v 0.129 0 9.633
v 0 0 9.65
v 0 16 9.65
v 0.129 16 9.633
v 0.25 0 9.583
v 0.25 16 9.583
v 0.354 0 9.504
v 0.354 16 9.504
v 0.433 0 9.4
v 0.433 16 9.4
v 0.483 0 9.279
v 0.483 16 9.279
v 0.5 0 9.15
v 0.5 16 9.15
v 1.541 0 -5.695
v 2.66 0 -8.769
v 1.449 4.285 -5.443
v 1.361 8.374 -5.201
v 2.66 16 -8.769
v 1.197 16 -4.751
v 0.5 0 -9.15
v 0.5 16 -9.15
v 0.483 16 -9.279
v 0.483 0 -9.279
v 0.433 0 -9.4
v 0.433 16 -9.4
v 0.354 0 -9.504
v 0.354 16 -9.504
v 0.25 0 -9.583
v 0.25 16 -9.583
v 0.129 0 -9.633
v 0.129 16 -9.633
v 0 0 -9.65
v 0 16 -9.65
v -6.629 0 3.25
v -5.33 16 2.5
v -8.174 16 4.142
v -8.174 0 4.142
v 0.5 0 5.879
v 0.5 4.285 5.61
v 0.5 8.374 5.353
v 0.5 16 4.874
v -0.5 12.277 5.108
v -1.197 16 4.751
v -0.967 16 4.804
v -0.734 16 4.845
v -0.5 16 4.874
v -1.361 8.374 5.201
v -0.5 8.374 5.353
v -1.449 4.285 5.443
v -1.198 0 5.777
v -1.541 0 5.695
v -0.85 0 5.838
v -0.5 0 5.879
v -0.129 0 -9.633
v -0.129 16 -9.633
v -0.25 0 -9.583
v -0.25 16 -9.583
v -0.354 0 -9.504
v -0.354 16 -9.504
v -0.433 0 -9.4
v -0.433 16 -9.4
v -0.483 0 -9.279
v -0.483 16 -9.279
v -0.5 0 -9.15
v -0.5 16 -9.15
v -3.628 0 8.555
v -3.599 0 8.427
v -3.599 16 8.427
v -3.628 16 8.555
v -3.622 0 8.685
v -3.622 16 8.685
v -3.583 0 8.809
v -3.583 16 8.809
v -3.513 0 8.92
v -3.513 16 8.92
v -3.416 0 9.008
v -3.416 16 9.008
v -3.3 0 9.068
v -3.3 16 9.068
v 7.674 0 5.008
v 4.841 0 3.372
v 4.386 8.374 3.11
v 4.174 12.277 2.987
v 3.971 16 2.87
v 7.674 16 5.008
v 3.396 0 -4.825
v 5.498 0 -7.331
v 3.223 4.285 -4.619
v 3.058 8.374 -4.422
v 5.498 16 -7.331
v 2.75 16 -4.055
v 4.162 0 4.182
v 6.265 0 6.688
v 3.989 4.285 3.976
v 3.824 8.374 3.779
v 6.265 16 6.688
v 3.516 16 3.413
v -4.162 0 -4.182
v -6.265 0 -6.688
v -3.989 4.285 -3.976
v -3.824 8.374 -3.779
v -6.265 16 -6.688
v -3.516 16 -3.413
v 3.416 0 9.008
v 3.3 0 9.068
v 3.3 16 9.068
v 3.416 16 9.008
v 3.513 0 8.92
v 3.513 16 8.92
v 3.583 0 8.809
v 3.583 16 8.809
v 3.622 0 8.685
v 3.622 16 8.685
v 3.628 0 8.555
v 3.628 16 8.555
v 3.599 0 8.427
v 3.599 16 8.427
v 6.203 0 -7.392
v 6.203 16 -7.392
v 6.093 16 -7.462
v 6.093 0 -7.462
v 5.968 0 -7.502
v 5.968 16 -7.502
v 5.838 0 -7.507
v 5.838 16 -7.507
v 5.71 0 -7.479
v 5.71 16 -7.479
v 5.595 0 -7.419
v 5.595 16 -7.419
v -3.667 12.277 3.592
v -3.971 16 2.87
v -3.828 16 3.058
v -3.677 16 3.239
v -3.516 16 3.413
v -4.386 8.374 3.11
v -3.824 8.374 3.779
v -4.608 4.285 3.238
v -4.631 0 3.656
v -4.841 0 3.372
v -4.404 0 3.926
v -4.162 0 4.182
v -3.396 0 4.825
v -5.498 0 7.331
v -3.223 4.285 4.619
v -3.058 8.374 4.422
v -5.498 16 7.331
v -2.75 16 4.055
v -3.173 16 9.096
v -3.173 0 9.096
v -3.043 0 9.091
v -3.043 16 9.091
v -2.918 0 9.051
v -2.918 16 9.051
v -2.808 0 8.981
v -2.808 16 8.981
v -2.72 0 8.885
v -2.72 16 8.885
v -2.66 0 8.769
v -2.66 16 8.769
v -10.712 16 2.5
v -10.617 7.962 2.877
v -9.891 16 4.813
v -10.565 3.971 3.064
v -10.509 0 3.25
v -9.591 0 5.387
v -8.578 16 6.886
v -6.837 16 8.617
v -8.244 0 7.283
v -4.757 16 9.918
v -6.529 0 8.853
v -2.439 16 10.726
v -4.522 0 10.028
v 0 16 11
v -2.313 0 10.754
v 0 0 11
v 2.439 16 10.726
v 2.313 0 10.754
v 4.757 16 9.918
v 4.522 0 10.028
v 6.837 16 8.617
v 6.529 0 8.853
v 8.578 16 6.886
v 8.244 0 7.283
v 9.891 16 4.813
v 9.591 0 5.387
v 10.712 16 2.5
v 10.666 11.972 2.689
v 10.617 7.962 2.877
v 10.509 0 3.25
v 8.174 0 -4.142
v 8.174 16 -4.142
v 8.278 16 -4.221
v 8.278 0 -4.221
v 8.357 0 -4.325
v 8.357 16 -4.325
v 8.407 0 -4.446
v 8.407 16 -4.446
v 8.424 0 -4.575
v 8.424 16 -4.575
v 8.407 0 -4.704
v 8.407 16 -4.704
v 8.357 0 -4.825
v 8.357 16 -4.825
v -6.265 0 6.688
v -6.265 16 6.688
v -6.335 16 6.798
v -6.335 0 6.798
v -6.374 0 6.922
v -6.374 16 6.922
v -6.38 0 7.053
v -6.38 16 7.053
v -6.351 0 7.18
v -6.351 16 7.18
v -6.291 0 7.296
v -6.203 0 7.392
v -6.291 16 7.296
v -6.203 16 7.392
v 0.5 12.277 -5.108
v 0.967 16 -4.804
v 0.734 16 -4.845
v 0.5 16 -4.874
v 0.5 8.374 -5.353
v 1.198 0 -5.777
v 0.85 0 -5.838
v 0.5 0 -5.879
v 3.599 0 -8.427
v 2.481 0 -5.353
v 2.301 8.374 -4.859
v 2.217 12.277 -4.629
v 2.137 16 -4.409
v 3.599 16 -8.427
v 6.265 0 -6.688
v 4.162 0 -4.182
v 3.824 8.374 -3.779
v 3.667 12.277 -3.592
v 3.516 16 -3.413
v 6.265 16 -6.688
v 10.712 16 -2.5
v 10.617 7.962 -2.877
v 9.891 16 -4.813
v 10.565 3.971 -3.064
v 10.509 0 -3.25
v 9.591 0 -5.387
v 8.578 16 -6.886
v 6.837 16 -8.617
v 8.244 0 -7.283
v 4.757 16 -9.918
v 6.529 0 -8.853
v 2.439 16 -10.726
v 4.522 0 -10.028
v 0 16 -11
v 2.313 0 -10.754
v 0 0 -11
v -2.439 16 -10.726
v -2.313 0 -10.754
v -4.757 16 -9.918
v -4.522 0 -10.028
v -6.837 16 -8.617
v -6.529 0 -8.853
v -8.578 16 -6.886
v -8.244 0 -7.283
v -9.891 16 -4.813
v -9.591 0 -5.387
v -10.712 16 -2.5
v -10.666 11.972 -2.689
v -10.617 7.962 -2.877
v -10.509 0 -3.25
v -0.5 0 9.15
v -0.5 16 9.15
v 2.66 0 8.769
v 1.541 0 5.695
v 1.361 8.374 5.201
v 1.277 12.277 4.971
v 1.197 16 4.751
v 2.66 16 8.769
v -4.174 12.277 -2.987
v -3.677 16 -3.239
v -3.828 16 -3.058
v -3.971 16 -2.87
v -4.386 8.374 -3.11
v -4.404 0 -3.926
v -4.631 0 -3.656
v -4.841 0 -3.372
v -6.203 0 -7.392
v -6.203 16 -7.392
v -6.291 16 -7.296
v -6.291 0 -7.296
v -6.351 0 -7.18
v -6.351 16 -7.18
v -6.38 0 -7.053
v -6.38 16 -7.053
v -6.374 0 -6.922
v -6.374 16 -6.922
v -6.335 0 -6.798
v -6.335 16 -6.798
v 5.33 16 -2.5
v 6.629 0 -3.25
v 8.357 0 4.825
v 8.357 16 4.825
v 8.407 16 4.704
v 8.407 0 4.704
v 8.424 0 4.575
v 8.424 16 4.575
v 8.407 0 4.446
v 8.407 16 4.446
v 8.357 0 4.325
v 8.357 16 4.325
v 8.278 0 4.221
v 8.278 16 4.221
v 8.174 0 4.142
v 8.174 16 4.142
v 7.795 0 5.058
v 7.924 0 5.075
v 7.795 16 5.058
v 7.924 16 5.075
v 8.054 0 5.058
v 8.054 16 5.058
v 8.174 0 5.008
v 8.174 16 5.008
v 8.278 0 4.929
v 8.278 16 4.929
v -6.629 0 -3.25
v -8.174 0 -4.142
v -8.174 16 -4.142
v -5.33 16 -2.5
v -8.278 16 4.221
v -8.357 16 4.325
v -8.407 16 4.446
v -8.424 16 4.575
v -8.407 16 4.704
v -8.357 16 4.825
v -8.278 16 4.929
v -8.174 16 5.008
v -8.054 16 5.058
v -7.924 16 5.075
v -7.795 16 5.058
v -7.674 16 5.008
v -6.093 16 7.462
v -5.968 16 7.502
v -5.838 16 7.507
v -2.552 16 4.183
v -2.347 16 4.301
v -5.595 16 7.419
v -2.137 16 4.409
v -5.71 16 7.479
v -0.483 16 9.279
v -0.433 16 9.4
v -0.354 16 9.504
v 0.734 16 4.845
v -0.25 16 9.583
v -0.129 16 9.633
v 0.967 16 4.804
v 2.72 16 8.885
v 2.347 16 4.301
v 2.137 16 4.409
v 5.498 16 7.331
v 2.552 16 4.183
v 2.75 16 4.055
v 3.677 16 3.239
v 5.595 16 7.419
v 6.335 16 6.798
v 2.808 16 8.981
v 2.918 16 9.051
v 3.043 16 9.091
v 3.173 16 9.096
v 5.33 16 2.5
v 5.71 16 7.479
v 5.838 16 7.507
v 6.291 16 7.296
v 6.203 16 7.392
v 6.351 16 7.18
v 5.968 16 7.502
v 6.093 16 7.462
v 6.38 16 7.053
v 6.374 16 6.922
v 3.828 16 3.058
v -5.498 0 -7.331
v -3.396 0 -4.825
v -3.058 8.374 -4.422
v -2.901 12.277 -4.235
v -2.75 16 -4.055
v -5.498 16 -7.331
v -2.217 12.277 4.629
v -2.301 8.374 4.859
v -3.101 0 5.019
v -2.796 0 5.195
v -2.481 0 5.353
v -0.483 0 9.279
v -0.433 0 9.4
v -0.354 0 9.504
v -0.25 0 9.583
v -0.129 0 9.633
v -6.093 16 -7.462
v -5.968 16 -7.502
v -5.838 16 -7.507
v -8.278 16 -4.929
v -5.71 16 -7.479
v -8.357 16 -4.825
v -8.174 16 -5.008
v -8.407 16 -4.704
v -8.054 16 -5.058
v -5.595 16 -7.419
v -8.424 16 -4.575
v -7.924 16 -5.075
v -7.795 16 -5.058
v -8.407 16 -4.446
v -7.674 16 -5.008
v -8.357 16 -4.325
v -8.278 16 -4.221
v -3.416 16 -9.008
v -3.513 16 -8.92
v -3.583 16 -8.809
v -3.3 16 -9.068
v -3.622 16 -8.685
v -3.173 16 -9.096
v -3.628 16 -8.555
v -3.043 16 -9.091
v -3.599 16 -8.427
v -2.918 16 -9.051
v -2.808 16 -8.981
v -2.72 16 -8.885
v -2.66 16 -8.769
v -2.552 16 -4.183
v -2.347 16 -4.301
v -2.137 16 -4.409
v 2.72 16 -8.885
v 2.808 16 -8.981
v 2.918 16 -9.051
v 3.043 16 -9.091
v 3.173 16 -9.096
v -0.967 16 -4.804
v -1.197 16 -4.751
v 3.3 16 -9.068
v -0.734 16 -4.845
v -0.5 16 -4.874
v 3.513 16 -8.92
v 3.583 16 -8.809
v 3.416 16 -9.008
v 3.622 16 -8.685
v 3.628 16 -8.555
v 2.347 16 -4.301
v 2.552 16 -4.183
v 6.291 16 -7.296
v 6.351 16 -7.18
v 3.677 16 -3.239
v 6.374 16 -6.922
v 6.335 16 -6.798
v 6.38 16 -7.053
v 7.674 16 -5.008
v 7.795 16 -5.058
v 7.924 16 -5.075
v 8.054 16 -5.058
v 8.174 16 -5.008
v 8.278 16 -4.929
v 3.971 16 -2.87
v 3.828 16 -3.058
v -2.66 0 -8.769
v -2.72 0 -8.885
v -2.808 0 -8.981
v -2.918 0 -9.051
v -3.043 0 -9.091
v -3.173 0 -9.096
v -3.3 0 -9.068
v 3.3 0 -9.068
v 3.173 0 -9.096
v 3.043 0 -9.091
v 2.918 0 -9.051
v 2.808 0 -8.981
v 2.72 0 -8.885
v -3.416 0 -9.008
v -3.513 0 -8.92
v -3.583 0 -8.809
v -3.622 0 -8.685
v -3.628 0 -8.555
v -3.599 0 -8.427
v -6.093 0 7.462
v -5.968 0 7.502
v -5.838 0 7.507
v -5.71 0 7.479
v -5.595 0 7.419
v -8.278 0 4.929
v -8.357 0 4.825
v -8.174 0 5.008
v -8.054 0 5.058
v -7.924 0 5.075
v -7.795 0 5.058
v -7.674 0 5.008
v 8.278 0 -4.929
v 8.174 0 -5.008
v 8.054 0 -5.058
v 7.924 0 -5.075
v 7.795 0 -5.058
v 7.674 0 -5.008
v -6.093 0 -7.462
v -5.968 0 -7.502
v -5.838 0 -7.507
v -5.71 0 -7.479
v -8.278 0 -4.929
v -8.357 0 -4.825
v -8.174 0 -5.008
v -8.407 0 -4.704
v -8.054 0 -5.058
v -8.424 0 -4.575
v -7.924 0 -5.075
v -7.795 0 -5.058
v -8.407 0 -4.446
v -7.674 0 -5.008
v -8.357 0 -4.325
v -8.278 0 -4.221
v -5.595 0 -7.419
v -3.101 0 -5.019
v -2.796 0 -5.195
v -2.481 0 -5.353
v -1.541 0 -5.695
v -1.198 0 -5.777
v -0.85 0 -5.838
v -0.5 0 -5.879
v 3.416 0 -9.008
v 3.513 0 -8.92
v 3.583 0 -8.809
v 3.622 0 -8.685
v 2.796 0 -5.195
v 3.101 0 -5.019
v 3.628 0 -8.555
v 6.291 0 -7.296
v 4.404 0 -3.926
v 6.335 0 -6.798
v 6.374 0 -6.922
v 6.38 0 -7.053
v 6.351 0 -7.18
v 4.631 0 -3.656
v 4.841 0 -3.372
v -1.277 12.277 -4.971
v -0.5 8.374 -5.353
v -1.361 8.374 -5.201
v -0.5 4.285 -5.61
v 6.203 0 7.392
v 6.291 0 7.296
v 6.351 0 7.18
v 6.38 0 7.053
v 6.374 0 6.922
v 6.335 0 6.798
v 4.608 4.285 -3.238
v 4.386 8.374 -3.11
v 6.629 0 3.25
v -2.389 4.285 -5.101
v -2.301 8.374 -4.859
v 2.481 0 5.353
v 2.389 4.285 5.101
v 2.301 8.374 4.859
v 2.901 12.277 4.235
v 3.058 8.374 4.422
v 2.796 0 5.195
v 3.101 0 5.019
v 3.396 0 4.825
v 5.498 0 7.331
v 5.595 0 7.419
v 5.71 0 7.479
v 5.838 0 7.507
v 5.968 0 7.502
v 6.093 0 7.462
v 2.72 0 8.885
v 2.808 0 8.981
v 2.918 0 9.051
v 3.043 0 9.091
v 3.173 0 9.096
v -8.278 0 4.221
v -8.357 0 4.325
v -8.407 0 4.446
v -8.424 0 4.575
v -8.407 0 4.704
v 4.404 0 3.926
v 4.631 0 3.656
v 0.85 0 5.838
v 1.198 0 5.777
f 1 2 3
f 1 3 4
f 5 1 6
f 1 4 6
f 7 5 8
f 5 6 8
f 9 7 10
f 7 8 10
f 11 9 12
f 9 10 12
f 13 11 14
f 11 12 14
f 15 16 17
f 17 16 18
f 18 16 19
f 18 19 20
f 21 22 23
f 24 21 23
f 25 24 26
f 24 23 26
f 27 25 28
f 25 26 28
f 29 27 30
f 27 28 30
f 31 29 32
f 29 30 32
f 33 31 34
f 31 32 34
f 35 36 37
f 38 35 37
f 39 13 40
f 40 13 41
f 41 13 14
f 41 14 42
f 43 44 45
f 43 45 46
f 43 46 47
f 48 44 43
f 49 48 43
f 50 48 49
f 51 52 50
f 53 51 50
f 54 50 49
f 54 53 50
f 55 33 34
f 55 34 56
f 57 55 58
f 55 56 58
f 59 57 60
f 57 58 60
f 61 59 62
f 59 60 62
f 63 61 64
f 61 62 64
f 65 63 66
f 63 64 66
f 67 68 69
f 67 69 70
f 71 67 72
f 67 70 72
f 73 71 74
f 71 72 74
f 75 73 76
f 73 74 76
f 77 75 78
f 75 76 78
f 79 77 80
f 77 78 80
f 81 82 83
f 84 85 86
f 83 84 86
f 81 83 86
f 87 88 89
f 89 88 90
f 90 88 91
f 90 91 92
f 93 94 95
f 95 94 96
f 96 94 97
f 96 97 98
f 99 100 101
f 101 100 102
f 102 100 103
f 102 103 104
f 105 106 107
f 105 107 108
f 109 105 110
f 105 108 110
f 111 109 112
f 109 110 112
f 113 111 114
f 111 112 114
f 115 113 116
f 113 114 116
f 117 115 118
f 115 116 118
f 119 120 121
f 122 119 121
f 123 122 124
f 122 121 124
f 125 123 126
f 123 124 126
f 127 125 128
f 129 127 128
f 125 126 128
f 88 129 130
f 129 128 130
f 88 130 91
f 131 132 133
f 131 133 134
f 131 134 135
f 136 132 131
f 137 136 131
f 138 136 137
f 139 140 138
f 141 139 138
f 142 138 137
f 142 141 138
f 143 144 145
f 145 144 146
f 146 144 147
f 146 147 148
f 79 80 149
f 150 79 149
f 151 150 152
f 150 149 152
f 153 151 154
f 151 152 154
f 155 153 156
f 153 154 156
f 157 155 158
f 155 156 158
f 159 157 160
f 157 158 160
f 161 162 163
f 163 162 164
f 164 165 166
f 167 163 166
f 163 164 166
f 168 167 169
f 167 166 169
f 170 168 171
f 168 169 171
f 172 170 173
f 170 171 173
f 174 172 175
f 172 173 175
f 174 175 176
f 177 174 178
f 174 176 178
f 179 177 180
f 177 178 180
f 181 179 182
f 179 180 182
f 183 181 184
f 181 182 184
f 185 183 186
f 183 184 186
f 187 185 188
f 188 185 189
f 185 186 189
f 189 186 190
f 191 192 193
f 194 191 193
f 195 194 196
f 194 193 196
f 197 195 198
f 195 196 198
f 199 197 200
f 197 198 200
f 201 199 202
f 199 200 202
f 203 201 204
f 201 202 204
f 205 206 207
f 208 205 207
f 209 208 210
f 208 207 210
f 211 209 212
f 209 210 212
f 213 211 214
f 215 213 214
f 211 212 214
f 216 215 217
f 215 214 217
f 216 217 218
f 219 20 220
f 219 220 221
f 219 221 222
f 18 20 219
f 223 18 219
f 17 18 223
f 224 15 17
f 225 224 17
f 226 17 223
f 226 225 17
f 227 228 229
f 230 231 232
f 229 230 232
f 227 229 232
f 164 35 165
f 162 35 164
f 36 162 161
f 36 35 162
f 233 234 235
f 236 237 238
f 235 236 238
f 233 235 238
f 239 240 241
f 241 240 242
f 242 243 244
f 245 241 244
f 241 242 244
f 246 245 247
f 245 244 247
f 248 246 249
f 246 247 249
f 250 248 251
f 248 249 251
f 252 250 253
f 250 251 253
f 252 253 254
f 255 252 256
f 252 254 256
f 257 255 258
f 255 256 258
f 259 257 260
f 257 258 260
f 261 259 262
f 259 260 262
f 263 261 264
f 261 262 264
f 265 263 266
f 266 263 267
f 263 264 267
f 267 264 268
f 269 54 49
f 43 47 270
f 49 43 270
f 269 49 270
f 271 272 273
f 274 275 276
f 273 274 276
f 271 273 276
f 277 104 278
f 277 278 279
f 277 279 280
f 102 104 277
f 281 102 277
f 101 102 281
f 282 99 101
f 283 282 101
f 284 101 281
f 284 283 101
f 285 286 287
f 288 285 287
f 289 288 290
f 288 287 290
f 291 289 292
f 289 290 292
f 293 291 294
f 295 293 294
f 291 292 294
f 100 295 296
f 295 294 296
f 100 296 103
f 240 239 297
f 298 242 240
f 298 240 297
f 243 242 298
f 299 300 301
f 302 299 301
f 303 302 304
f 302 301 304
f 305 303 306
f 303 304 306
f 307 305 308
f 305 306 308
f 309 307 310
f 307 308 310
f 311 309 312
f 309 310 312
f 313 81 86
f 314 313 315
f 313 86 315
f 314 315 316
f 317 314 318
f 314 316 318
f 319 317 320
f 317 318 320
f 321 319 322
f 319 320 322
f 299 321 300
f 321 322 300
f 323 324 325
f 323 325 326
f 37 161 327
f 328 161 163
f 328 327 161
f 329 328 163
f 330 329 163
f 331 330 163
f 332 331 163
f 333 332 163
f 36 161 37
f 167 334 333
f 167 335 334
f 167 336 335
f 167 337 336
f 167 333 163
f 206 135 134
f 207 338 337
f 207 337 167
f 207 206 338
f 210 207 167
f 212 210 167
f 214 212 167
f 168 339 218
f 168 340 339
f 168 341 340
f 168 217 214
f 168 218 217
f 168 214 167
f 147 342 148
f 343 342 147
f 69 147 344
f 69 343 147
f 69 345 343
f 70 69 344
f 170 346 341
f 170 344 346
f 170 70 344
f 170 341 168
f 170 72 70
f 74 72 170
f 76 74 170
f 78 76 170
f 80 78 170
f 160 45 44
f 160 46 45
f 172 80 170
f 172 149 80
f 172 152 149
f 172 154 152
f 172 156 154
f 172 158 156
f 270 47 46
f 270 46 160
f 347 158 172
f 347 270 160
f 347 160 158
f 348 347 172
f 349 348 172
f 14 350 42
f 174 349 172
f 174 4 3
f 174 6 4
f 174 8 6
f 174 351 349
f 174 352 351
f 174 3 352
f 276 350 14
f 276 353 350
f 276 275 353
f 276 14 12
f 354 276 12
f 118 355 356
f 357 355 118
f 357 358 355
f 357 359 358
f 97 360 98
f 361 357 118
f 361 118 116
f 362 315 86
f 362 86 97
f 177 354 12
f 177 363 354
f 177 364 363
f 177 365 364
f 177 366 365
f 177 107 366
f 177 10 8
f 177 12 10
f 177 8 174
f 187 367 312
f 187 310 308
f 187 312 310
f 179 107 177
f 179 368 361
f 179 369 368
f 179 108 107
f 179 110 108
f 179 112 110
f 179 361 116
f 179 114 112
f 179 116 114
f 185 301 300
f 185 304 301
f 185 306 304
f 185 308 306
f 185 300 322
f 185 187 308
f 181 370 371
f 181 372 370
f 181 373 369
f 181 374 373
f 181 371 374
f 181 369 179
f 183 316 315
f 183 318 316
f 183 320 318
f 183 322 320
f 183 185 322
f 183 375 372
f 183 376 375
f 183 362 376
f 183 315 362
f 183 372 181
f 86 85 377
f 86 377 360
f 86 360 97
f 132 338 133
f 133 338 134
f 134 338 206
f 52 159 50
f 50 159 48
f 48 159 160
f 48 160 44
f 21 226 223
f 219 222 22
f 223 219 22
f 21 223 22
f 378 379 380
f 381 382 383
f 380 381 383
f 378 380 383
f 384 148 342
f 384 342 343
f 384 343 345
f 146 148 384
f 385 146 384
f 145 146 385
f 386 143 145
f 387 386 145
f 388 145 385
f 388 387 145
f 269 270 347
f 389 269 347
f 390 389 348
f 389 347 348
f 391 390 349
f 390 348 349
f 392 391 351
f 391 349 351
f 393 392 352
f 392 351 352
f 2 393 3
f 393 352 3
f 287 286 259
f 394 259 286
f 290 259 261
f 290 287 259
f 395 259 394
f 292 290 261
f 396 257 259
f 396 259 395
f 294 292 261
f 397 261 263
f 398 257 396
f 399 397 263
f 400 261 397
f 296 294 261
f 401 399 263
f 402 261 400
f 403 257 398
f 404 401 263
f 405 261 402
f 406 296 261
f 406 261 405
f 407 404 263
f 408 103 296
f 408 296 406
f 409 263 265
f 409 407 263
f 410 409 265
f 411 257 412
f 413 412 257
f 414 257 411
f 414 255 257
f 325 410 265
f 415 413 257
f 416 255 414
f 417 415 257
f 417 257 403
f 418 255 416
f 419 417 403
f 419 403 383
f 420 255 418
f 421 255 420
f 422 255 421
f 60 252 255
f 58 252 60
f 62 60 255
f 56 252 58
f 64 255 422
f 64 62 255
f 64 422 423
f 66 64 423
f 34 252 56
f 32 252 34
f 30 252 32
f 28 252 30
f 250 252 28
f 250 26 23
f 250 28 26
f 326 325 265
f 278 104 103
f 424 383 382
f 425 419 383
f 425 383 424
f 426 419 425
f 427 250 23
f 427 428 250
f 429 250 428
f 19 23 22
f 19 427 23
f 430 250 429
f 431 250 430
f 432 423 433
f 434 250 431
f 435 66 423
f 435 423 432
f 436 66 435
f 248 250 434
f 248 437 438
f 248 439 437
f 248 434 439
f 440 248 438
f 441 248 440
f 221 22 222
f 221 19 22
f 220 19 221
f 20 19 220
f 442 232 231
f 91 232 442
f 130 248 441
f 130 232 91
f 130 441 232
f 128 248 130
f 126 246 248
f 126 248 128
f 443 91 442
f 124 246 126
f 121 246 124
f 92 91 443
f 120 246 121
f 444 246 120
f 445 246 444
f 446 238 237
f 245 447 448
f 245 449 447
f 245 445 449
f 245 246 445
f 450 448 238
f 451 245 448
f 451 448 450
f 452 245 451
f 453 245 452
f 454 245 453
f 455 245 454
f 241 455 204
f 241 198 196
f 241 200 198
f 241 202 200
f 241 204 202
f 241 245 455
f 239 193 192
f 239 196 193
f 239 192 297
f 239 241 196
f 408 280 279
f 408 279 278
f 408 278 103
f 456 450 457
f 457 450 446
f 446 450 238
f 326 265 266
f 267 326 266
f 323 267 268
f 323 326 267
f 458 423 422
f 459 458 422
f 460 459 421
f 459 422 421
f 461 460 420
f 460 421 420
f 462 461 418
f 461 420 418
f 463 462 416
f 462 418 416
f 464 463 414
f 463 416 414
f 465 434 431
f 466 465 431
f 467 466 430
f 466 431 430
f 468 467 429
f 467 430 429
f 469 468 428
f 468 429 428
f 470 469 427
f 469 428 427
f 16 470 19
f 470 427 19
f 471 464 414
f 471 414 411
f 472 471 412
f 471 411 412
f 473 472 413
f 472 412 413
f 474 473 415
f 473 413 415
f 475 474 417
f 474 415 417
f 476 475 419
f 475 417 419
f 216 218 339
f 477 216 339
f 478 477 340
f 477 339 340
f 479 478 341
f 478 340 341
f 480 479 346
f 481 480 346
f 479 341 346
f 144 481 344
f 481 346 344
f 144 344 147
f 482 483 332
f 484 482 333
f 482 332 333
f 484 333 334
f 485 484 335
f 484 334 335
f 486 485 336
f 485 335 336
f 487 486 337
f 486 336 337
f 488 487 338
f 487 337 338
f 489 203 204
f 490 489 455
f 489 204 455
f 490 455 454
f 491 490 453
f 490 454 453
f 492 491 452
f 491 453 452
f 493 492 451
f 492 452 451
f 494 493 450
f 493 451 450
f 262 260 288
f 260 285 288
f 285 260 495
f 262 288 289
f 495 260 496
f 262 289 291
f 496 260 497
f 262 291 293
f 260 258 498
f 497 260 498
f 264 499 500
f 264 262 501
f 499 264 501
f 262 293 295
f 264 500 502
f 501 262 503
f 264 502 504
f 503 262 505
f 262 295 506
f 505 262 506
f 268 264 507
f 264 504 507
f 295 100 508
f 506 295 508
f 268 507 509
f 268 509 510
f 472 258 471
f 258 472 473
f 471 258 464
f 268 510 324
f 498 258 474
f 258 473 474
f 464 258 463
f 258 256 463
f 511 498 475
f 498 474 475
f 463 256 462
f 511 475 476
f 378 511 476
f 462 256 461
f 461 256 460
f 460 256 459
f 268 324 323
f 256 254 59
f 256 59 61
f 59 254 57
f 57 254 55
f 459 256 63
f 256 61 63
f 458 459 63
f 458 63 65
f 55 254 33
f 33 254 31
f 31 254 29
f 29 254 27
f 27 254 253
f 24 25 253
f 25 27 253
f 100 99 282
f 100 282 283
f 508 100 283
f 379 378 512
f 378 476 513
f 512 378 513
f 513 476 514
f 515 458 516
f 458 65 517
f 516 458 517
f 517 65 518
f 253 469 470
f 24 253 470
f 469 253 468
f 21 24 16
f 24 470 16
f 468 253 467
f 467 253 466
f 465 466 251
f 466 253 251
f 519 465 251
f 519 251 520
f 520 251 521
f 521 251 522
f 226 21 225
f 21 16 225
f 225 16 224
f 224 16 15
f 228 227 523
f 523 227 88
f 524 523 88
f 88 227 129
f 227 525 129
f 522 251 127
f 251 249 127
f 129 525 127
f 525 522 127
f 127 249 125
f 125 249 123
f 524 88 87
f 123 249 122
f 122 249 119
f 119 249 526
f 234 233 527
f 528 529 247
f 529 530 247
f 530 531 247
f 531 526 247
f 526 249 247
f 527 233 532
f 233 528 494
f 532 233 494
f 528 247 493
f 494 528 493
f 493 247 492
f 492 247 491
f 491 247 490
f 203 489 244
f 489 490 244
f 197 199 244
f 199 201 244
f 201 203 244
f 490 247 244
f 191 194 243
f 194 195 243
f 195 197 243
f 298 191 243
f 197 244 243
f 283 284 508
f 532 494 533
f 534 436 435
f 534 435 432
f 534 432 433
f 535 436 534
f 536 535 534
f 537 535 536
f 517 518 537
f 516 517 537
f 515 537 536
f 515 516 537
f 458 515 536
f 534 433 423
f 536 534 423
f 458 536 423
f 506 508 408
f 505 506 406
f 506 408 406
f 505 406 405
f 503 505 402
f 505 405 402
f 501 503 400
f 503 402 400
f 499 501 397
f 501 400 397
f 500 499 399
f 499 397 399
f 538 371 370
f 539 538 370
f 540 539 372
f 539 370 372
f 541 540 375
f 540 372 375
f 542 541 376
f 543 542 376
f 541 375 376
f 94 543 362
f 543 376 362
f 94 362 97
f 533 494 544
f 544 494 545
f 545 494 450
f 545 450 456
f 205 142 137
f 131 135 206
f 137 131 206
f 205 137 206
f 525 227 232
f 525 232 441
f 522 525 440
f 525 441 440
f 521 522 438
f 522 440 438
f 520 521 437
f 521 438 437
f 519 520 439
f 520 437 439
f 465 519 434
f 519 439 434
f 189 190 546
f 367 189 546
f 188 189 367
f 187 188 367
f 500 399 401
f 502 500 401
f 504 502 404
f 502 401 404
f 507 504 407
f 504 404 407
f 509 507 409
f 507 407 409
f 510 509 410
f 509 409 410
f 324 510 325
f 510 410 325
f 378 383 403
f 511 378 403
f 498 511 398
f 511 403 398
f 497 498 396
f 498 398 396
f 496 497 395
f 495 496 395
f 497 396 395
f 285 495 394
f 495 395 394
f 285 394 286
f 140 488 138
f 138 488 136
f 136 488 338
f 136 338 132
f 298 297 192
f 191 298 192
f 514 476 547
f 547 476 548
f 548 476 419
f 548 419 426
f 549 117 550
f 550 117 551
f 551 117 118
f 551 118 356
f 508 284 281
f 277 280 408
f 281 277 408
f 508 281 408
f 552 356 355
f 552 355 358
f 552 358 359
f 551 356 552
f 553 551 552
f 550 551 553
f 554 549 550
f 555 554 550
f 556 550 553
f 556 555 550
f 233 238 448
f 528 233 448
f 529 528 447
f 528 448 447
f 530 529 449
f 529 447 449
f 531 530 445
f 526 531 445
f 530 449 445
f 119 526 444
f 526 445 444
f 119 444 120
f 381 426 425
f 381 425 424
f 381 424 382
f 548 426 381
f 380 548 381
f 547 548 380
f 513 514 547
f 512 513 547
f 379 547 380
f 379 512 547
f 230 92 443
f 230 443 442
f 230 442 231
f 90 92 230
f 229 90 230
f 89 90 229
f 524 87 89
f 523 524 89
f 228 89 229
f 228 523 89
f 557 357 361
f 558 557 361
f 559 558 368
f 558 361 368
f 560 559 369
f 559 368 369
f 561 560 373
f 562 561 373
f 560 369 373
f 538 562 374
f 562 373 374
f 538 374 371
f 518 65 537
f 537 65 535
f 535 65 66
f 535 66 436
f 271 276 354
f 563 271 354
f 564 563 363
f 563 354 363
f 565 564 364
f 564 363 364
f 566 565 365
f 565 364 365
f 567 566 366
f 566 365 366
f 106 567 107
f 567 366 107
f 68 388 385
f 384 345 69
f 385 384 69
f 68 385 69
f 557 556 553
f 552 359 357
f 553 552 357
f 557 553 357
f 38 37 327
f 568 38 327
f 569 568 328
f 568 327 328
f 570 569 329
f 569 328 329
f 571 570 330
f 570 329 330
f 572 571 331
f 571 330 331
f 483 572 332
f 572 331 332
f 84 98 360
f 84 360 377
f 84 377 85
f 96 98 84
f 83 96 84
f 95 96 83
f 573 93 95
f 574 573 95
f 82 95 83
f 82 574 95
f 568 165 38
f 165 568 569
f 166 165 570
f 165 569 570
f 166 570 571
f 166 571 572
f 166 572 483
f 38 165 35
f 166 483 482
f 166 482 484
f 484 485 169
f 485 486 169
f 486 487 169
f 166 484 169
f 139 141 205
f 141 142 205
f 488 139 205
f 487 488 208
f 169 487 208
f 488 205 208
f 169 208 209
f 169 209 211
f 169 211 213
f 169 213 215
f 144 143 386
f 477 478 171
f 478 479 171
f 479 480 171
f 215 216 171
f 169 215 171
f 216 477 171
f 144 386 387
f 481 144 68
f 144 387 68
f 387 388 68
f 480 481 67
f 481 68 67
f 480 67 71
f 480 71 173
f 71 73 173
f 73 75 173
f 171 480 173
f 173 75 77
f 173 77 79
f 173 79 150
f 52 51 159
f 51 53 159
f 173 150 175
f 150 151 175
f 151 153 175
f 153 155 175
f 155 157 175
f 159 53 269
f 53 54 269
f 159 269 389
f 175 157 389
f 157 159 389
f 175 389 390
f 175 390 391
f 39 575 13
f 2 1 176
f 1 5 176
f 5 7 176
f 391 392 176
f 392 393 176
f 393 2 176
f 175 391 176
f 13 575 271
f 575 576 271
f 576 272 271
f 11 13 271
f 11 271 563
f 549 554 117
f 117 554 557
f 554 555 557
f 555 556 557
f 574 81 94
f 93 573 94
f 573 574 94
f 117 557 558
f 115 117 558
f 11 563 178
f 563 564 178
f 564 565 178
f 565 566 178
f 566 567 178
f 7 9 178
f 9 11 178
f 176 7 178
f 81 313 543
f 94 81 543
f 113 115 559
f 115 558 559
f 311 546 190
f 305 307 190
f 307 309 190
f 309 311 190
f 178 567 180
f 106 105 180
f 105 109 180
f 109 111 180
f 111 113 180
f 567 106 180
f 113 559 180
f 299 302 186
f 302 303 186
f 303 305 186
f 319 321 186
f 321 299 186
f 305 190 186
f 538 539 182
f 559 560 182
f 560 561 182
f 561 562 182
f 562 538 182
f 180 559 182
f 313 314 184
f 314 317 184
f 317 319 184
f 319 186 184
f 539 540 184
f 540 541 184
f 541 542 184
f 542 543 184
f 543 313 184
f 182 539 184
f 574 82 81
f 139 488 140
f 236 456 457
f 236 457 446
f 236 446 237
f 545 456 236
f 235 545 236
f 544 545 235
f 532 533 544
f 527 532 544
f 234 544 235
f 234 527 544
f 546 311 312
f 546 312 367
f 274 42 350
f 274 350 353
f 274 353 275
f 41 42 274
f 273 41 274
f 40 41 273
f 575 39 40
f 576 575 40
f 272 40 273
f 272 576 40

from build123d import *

# Parameters (mm, degrees)
SKETCH1_R           = 11
BOSS_EXTRUDE1_DEPTH = 16
CUT_EXTRUDE1_DEPTH  = 23.315913604
CUT_EXTRUDE2_DEPTH  = 15


with BuildPart() as part:
    # Sketch1 → Boss-Extrude1 (new body)
    with BuildSketch(Plane(origin=(0, 0, 0), x_dir=(1, 0, 0), z_dir=(0, 1, 0))):
        with Locations(Location((0, 0, 0), (0, 0, 270))):
            Circle(SKETCH1_R)
    extrude(amount=BOSS_EXTRUDE1_DEPTH)

    # Sketch2 → Cut-Revolve1 (revolve, cut)
    with BuildSketch(Plane(origin=(0, 0, 0), x_dir=(0, 0, -1), z_dir=(1, 0, 0))):
        Polygon((0, 0), (0, 16), (4.9, 16), (5.9, 0), align=None)
    revolve(axis=Axis((0, 0, 0), (0, 1, 0)), mode=Mode.SUBTRACT)

    # Sketch3 → Cut-Extrude1 (cut, through all)
    with BuildSketch(Plane(origin=(0, 16, 0), x_dir=(1, 0, 0), z_dir=(0, 1, 0))):
        with BuildLine():
            Line((-0.5, 4.8), (0.5, 4.8))
            Line((0.5, 4.8), (0.5, 9.15))
            ThreePointArc((0.5, 9.15), (0.353553391, 9.503553391), (0, 9.65))
            ThreePointArc((0, 9.65), (-0.353553391, 9.503553391), (-0.5, 9.15))
            Line((-0.5, 9.15), (-0.5, 4.8))
        make_face()
        with BuildLine():
            Line((1.171850378, 4.681534651), (2.111542998, 4.339514508))
            Line((2.111542998, 4.339514508), (3.599330622, 8.427177409))
            ThreePointArc((3.599330622, 8.427177409), (3.582638205, 8.809496611), (3.300494383, 9.068033791))
            ThreePointArc((3.300494383, 9.068033791), (2.918175181, 9.051341374), (2.659638001, 8.769197552))
            Line((2.659638001, 8.769197552), (1.171850378, 4.681534651))
        make_face()
        with BuildLine():
            Line((2.702358305, 3.998407132), (3.468402748, 3.355619522))
            Line((3.468402748, 3.355619522), (6.26452885, 6.68791285))
            ThreePointArc((6.26452885, 6.68791285), (6.379603978, 7.052884526), (6.202900433, 7.392328876))
            ThreePointArc((6.202900433, 7.392328876), (5.837928757, 7.507404004), (5.498484407, 7.330700459))
            Line((5.498484407, 7.330700459), (2.702358305, 3.998407132))
        make_face()
        with BuildLine():
            Line((3.906921938, 2.833012702), (4.406921938, 1.966987298))
            Line((4.406921938, 1.966987298), (8.174132445, 4.141987298))
            ThreePointArc((8.174132445, 4.141987298), (8.407095358, 4.445590477), (8.357145147, 4.825))
            ThreePointArc((8.357145147, 4.825), (8.053541967, 5.057962913), (7.674132445, 5.008012702))
            Line((7.674132445, 5.008012702), (3.906921938, 2.833012702))
        make_face()
        with BuildLine():
            Line((4.640253126, 1.325915129), (4.813901303, 0.341107376))
            Line((4.813901303, 0.341107376), (9.097815029, 1.096476949))
            ThreePointArc((9.097815029, 1.096476949), (9.420566962, 1.302092607), (9.503394817, 1.675704914))
            ThreePointArc((9.503394817, 1.675704914), (9.297779158, 1.998456848), (8.924166851, 2.081284702))
            Line((8.924166851, 2.081284702), (4.640253126, 1.325915129))
        make_face()
        with BuildLine():
            Line((4.813901303, -0.341107376), (4.640253126, -1.325915129))
            Line((4.640253126, -1.325915129), (8.924166851, -2.081284702))
            ThreePointArc((8.924166851, -2.081284702), (9.297779158, -1.998456848), (9.503394817, -1.675704914))
            ThreePointArc((9.503394817, -1.675704914), (9.420566962, -1.302092607), (9.097815029, -1.096476949))
            Line((9.097815029, -1.096476949), (4.813901303, -0.341107376))
        make_face()
        with BuildLine():
            Line((4.406921938, -1.966987298), (3.906921938, -2.833012702))
            Line((3.906921938, -2.833012702), (7.674132445, -5.008012702))
            ThreePointArc((7.674132445, -5.008012702), (8.053541967, -5.057962913), (8.357145147, -4.825))
            ThreePointArc((8.357145147, -4.825), (8.407095358, -4.445590477), (8.174132445, -4.141987298))
            Line((8.174132445, -4.141987298), (4.406921938, -1.966987298))
        make_face()
        with BuildLine():
            Line((3.468402748, -3.355619522), (2.702358305, -3.998407132))
            Line((2.702358305, -3.998407132), (5.498484407, -7.330700459))
            ThreePointArc((5.498484407, -7.330700459), (5.837928757, -7.507404004), (6.202900433, -7.392328876))
            ThreePointArc((6.202900433, -7.392328876), (6.379603978, -7.052884526), (6.26452885, -6.68791285))
            Line((6.26452885, -6.68791285), (3.468402748, -3.355619522))
        make_face()
        with BuildLine():
            Line((2.111542998, -4.339514508), (1.171850378, -4.681534651))
            Line((1.171850378, -4.681534651), (2.659638001, -8.769197552))
            ThreePointArc((2.659638001, -8.769197552), (2.918175181, -9.051341374), (3.300494383, -9.068033791))
            ThreePointArc((3.300494383, -9.068033791), (3.582638205, -8.809496611), (3.599330622, -8.427177409))
            Line((3.599330622, -8.427177409), (2.111542998, -4.339514508))
        make_face()
        with BuildLine():
            Line((0.5, -4.8), (-0.5, -4.8))
            Line((-0.5, -4.8), (-0.5, -9.15))
            ThreePointArc((-0.5, -9.15), (-0.353553391, -9.503553391), (0, -9.65))
            ThreePointArc((0, -9.65), (0.353553391, -9.503553391), (0.5, -9.15))
            Line((0.5, -9.15), (0.5, -4.8))
        make_face()
        with BuildLine():
            Line((-1.171850378, -4.681534651), (-2.111542998, -4.339514508))
            Line((-2.111542998, -4.339514508), (-3.599330622, -8.427177409))
            ThreePointArc((-3.599330622, -8.427177409), (-3.582638205, -8.809496611), (-3.300494383, -9.068033791))
            ThreePointArc((-3.300494383, -9.068033791), (-2.918175181, -9.051341374), (-2.659638001, -8.769197552))
            Line((-2.659638001, -8.769197552), (-1.171850378, -4.681534651))
        make_face()
        with BuildLine():
            Line((-2.702358305, -3.998407132), (-3.468402748, -3.355619522))
            Line((-3.468402748, -3.355619522), (-6.26452885, -6.68791285))
            ThreePointArc((-6.26452885, -6.68791285), (-6.379603978, -7.052884526), (-6.202900433, -7.392328876))
            ThreePointArc((-6.202900433, -7.392328876), (-5.837928757, -7.507404004), (-5.498484407, -7.330700459))
            Line((-5.498484407, -7.330700459), (-2.702358305, -3.998407132))
        make_face()
        with BuildLine():
            Line((-3.906921938, -2.833012702), (-4.406921938, -1.966987298))
            Line((-4.406921938, -1.966987298), (-8.174132445, -4.141987298))
            ThreePointArc((-8.174132445, -4.141987298), (-8.407095358, -4.445590477), (-8.357145147, -4.825))
            ThreePointArc((-8.357145147, -4.825), (-8.053541967, -5.057962913), (-7.674132445, -5.008012702))
            Line((-7.674132445, -5.008012702), (-3.906921938, -2.833012702))
        make_face()
        with BuildLine():
            Line((-4.640253126, -1.325915129), (-4.813901303, -0.341107376))
            Line((-4.813901303, -0.341107376), (-9.097815029, -1.096476949))
            ThreePointArc((-9.097815029, -1.096476949), (-9.420566962, -1.302092607), (-9.503394817, -1.675704914))
            ThreePointArc((-9.503394817, -1.675704914), (-9.297779158, -1.998456848), (-8.924166851, -2.081284702))
            Line((-8.924166851, -2.081284702), (-4.640253126, -1.325915129))
        make_face()
        with BuildLine():
            Line((-4.813901303, 0.341107376), (-4.640253126, 1.325915129))
            Line((-4.640253126, 1.325915129), (-8.924166851, 2.081284702))
            ThreePointArc((-8.924166851, 2.081284702), (-9.297779158, 1.998456848), (-9.503394817, 1.675704914))
            ThreePointArc((-9.503394817, 1.675704914), (-9.420566962, 1.302092607), (-9.097815029, 1.096476949))
            Line((-9.097815029, 1.096476949), (-4.813901303, 0.341107376))
        make_face()
        with BuildLine():
            Line((-4.406921938, 1.966987298), (-3.906921938, 2.833012702))
            Line((-3.906921938, 2.833012702), (-7.674132445, 5.008012702))
            ThreePointArc((-7.674132445, 5.008012702), (-8.053541967, 5.057962913), (-8.357145147, 4.825))
            ThreePointArc((-8.357145147, 4.825), (-8.407095358, 4.445590477), (-8.174132445, 4.141987298))
            Line((-8.174132445, 4.141987298), (-4.406921938, 1.966987298))
        make_face()
        with BuildLine():
            Line((-3.468402748, 3.355619522), (-2.702358305, 3.998407132))
            Line((-2.702358305, 3.998407132), (-5.498484407, 7.330700459))
            ThreePointArc((-5.498484407, 7.330700459), (-5.837928757, 7.507404004), (-6.202900433, 7.392328876))
            ThreePointArc((-6.202900433, 7.392328876), (-6.379603978, 7.052884526), (-6.26452885, 6.68791285))
            Line((-6.26452885, 6.68791285), (-3.468402748, 3.355619522))
        make_face()
        with BuildLine():
            Line((-2.111542998, 4.339514508), (-1.171850378, 4.681534651))
            Line((-1.171850378, 4.681534651), (-2.659638001, 8.769197552))
            ThreePointArc((-2.659638001, 8.769197552), (-2.918175181, 9.051341374), (-3.300494383, 9.068033791))
            ThreePointArc((-3.300494383, 9.068033791), (-3.582638205, 8.809496611), (-3.599330622, 8.427177409))
            Line((-3.599330622, 8.427177409), (-2.111542998, 4.339514508))
        make_face()
    extrude(amount=-CUT_EXTRUDE1_DEPTH, mode=Mode.SUBTRACT)

    # Sketch4 → Cut-Extrude2 (cut, symmetric)
    with BuildSketch(Plane(origin=(0, 0, 0), x_dir=(0, 0, -1), z_dir=(1, 0, 0))):
        Polygon((0, 16), (2.5, 16), (3.25, 0), (-3.25, 0), (-2.5, 16), align=None)
    extrude(amount=CUT_EXTRUDE2_DEPTH, both=True, mode=Mode.SUBTRACT)


with BuildPart() as cut_extrude2_piece_1:
    # of the separate pieces the step leaves, piece 1, a body of its own (cut_extrude2_pieces)
    add(part.part.solids().sort_by_distance((-10.508924778, 0, 3.25))[0])


with BuildPart() as cut_extrude2_piece_2:
    # of the separate pieces the step leaves, piece 2, a body of its own (cut_extrude2_pieces)
    add(part.part.solids().sort_by_distance((10.508924778, 0, -3.25))[0])


solid = Compound([cut_extrude2_piece_1.part, cut_extrude2_piece_2.part])
